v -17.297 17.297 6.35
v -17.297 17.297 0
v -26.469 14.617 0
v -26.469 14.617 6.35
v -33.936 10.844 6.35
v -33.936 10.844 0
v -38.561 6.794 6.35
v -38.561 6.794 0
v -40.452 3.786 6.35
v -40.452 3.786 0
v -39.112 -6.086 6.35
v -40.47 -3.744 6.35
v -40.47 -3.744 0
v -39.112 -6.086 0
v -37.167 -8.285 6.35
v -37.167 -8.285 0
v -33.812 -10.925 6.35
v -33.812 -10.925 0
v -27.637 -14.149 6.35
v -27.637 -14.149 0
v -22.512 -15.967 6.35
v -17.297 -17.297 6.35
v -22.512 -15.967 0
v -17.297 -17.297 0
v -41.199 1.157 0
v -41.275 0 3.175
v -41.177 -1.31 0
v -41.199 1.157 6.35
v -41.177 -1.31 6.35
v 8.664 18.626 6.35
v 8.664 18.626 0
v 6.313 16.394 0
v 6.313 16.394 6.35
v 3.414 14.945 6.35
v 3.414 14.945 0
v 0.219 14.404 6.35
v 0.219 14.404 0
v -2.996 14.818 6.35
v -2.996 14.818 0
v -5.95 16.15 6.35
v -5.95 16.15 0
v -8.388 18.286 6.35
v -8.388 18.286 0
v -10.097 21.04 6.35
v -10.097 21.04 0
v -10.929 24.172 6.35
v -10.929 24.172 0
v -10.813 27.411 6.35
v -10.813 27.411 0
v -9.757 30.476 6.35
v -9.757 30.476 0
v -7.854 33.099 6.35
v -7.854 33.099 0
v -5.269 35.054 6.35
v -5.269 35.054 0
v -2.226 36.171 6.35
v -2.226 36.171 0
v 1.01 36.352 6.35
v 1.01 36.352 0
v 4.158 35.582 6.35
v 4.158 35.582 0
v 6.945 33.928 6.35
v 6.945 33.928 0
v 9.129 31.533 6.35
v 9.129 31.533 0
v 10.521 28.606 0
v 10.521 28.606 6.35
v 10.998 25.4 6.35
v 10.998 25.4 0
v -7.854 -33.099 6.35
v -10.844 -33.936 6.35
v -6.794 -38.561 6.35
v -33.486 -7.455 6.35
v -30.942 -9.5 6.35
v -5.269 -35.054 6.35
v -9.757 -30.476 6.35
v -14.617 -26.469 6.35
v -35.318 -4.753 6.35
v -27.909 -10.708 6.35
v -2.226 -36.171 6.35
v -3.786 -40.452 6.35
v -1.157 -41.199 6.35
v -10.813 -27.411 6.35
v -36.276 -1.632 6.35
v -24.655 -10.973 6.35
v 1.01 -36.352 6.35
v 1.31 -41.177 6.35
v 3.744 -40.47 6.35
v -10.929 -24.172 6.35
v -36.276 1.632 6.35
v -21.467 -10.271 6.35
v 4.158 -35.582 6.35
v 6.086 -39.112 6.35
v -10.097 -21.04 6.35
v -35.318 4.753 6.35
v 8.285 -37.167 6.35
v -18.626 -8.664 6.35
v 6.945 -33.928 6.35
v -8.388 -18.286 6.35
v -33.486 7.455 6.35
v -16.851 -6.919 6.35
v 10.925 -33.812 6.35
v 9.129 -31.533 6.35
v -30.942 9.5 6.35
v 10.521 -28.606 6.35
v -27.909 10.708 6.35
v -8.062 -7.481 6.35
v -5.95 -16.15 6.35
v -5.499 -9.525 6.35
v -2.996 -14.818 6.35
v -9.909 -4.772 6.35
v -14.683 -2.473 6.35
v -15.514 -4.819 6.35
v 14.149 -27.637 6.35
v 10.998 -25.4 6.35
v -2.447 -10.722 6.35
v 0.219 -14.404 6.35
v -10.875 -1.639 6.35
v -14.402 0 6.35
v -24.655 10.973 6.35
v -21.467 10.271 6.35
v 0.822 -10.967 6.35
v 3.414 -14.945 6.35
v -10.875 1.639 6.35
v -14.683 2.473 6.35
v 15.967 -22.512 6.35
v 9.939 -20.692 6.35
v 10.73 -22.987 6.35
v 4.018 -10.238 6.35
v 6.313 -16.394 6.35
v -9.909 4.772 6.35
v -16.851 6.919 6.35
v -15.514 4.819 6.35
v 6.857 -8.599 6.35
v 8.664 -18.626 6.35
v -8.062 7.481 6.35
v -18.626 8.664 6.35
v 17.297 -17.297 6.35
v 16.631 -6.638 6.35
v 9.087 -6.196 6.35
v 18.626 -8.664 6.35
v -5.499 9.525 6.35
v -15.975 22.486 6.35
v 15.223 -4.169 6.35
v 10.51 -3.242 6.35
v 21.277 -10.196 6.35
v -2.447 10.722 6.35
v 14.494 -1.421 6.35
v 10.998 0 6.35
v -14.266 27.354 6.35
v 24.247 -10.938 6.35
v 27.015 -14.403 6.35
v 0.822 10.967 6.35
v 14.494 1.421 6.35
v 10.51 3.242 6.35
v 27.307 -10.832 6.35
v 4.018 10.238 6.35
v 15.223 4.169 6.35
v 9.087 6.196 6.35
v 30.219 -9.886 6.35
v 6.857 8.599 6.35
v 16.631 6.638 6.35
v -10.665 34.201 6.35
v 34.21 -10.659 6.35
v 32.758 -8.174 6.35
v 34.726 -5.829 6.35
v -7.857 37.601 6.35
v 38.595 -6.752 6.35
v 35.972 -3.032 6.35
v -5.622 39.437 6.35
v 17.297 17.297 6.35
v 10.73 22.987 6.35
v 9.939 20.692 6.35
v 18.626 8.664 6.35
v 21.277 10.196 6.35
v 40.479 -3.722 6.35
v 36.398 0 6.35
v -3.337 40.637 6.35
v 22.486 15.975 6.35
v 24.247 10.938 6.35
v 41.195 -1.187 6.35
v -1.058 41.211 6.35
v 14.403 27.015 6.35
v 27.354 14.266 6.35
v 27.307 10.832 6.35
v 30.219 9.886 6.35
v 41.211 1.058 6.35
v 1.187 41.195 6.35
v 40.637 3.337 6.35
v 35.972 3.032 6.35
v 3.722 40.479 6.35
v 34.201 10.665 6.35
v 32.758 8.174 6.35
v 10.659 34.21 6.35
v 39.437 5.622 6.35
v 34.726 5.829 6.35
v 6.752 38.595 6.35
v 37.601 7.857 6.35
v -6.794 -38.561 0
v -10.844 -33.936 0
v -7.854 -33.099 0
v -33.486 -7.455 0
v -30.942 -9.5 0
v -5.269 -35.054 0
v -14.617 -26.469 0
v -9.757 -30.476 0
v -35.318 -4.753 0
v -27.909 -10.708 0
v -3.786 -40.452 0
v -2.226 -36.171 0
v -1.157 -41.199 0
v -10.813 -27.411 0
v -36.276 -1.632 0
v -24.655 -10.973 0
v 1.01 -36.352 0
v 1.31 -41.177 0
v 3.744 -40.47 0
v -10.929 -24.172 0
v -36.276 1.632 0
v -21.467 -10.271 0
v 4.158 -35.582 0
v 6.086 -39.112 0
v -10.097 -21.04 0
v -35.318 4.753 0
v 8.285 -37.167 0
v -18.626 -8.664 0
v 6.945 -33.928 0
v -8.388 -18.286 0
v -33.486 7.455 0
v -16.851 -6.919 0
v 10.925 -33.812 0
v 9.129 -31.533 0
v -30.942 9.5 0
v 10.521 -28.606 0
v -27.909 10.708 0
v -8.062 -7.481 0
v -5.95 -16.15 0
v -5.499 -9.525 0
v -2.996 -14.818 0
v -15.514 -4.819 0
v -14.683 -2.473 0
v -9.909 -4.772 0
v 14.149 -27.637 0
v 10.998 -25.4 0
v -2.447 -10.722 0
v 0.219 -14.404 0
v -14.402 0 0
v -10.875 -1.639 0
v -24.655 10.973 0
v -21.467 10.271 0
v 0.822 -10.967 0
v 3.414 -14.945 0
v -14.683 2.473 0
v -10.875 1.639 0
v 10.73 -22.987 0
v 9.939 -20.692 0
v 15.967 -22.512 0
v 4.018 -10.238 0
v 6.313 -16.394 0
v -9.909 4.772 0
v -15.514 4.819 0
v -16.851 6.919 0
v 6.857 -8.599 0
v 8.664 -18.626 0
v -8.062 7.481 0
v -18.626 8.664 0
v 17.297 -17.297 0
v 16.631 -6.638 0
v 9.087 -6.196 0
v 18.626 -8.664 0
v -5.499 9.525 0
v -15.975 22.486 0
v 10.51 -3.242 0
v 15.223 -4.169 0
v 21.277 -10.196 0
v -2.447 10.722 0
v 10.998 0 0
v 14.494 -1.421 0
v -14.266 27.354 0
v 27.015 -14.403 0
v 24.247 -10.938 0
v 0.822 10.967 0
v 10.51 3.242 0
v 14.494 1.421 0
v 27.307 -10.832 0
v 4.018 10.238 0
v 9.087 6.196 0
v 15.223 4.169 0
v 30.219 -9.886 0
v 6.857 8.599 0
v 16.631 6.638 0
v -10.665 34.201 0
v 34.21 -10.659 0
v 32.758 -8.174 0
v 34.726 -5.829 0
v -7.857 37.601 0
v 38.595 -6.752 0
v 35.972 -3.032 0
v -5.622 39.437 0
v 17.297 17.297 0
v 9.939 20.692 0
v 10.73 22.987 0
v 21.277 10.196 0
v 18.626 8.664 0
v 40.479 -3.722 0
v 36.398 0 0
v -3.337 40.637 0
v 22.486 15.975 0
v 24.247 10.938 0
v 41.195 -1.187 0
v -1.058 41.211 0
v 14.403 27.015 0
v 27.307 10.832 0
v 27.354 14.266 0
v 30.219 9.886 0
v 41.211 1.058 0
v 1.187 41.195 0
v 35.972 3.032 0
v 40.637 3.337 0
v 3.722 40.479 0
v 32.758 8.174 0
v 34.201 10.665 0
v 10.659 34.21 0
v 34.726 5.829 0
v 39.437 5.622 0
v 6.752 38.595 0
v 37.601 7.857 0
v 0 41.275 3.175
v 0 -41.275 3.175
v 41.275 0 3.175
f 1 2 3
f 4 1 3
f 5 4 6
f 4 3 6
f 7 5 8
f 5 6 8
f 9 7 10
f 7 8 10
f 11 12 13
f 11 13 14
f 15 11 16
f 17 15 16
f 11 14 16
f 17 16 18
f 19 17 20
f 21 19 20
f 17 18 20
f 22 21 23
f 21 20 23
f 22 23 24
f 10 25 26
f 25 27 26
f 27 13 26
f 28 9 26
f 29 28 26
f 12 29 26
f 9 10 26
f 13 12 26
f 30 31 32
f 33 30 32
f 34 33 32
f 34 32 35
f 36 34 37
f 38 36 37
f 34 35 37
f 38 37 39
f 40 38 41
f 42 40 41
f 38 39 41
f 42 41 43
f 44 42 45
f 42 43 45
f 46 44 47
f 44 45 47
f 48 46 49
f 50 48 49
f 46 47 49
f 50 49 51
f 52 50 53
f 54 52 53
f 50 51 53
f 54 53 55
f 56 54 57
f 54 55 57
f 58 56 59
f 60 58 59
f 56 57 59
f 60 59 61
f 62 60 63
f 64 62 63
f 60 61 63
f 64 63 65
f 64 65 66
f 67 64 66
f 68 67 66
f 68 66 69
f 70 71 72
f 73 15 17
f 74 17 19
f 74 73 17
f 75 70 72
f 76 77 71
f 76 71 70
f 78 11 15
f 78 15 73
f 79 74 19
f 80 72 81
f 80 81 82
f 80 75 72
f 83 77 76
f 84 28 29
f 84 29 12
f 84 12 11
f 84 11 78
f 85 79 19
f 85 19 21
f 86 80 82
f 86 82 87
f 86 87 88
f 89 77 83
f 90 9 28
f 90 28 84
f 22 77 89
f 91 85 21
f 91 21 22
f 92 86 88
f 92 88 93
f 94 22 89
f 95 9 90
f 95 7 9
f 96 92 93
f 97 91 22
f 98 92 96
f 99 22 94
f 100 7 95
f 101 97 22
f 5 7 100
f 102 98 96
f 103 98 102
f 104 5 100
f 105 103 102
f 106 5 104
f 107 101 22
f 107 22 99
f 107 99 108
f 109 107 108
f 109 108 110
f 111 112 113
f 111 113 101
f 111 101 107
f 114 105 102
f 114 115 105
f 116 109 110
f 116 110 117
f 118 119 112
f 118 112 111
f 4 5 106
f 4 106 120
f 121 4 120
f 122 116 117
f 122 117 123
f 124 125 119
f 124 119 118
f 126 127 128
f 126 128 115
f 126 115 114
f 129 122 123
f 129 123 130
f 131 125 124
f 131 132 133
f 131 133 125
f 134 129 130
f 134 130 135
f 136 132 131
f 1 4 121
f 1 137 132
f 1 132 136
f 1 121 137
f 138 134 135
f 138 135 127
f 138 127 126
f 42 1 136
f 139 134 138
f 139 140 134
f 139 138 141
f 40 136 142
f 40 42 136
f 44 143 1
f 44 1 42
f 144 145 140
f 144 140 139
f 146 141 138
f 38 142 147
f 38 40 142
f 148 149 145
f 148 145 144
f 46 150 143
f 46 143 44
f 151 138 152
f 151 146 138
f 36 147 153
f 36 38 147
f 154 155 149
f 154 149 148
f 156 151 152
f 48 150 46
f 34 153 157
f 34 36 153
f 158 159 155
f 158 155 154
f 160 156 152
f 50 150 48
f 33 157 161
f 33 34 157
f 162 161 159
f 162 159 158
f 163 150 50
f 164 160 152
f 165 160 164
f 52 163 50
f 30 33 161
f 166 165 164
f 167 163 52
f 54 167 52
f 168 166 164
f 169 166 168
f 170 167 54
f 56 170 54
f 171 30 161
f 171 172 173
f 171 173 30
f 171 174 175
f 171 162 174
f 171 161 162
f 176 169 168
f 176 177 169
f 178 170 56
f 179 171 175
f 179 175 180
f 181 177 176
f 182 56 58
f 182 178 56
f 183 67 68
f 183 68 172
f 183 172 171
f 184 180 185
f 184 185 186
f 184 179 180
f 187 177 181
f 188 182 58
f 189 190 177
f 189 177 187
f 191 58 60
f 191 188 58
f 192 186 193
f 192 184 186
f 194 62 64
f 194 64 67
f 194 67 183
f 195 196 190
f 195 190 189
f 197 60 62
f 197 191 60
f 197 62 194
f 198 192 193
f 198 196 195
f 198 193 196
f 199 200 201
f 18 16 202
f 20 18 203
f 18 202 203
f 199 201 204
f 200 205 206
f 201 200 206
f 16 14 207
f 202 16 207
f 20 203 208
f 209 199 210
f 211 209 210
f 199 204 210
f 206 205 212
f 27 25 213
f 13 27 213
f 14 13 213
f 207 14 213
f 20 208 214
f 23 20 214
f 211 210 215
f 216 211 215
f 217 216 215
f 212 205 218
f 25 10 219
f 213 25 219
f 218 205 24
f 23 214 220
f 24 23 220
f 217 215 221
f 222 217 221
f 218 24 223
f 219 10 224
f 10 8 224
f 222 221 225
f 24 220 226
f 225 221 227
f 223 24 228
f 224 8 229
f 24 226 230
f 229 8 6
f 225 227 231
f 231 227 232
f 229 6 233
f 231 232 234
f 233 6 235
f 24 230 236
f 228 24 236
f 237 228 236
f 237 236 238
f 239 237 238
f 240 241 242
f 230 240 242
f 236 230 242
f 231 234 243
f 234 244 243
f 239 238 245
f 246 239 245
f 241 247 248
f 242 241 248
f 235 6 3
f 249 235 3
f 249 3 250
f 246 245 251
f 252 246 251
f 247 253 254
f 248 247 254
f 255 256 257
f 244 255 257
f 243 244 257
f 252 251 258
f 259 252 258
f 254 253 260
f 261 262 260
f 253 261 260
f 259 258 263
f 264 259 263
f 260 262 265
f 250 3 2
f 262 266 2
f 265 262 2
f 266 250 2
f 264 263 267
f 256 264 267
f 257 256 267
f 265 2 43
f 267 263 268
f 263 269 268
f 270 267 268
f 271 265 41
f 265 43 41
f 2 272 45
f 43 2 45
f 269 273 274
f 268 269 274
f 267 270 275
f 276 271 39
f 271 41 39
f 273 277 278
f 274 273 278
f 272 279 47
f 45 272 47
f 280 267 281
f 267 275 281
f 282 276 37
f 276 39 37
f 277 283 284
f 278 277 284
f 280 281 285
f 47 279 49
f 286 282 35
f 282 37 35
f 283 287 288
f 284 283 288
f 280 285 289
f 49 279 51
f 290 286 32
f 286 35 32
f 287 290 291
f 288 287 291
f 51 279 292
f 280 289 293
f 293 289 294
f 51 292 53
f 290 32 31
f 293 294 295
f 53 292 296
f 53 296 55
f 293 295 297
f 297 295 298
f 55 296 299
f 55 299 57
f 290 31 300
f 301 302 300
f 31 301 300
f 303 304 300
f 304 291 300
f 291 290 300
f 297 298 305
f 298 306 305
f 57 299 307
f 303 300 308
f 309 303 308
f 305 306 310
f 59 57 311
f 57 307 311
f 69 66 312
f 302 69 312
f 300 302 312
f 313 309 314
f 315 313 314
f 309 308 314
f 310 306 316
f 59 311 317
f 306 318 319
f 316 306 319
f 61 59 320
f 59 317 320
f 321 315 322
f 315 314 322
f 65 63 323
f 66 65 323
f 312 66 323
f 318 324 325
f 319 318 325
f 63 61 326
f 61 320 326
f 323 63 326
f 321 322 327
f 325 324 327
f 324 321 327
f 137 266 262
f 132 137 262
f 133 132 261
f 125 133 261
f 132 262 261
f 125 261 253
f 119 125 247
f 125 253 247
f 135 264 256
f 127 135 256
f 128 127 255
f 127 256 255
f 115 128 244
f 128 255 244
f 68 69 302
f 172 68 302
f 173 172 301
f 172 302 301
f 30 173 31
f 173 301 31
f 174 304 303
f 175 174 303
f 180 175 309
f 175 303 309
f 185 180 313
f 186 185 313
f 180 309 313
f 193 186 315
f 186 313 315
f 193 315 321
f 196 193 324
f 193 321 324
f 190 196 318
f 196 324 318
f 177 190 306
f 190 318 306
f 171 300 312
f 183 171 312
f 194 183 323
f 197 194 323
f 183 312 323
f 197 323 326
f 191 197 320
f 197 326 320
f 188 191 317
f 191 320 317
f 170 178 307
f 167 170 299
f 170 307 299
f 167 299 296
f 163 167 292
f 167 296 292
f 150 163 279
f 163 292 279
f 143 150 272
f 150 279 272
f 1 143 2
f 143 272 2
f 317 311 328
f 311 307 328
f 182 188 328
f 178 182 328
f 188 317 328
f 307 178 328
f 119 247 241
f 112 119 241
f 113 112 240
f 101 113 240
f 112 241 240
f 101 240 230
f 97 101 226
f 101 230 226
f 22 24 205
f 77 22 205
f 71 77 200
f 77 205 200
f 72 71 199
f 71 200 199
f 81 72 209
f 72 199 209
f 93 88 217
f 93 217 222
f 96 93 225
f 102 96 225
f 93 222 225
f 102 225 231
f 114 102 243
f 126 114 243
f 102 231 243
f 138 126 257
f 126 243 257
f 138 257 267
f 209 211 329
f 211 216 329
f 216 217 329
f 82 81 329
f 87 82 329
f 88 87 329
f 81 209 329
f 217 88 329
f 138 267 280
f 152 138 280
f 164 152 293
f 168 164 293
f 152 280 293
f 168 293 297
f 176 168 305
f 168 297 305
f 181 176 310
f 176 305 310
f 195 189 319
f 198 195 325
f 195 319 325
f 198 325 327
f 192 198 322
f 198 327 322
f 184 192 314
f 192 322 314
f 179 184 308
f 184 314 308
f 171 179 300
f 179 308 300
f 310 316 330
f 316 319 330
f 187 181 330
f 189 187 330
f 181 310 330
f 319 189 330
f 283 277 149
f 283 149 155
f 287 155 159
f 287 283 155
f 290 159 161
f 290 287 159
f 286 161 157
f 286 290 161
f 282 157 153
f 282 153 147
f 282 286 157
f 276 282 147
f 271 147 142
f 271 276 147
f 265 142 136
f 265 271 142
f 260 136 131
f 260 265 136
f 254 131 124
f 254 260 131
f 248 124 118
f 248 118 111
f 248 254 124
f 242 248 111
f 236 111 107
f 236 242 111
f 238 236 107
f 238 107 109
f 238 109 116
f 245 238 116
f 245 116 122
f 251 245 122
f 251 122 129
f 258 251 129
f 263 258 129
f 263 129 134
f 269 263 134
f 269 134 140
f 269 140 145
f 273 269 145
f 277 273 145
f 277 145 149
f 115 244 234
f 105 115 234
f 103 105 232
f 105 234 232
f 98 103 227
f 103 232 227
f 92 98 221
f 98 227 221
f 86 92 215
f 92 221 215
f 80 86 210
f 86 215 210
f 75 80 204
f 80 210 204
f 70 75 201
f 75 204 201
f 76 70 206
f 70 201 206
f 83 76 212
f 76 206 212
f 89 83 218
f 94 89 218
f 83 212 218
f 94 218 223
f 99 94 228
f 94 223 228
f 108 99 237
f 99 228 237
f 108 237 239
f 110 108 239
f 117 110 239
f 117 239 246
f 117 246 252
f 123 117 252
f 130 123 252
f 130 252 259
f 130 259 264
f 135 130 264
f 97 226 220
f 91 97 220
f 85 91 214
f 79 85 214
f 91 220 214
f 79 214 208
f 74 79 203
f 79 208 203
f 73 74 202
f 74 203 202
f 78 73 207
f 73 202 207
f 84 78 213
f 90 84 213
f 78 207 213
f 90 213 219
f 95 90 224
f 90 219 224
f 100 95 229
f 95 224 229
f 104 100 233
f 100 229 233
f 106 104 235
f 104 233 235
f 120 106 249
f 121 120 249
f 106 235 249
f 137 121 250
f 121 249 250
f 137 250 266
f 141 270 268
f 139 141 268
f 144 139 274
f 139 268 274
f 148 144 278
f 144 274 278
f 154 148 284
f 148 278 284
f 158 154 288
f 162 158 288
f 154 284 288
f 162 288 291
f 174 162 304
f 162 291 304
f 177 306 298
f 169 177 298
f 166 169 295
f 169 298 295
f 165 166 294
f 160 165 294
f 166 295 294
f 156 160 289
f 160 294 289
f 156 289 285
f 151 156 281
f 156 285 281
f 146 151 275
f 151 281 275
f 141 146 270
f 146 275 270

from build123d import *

# Parameters (mm, degrees)
F0_R     = 10.9982
F1_DEPTH = 25.4
F2_DEPTH = 19.05


with BuildPart() as f1:
    # F0 (on Top) → F1 (new body)
    with BuildSketch(Plane.XY):
        with BuildLine():
            add(Edge.make_bspline(
                [(17.2966262747, -17.2966262747), (41.275, -12.1888070196), (41.275, 0)],
                knots=[5.144796756, 5.144796756, 5.144796756, 6.2831853072, 6.2831853072, 6.2831853072], degree=2, weights=[1, 0.8423354965, 1]))
            add(Edge.make_bspline(
                [(41.275, 0), (41.275, 12.1888070196), (17.2966262747, 17.2966262747)],
                knots=[0, 0, 0, 1.1383885512, 1.1383885512, 1.1383885512], degree=2, weights=[1, 0.8423354965, 1]))
            add(Edge.make_bspline(
                [(18.6255683012, 8.6641490291), (18.1820471955, 13.1400669524), (17.2966262747, 17.2966262747)],
                knots=[4.9238747078, 4.9238747078, 4.9238747078, 5.144796756, 5.144796756, 5.144796756], degree=2, weights=[1, 0.9939053819, 1]))
            ThreePointArc((18.6255683012, 8.6641490291), (30.2194319442, 9.8860244272), (36.3982, 0))
            ThreePointArc((36.3982, 0), (30.2194319442, -9.8860244272), (18.6255683012, -8.6641490291))
            add(Edge.make_bspline(
                [(17.2966262747, -17.2966262747), (18.1820471955, -13.1400669524), (18.6255683012, -8.6641490291)],
                knots=[4.2799812048, 4.2799812048, 4.2799812048, 4.5009032529, 4.5009032529, 4.5009032529], degree=2, weights=[1, 0.9939053819, 1]))
        make_face()
        with BuildLine():
            add(Edge.make_bspline(
                [(18.6255683012, 8.6641490291), (18.1820471955, 13.1400669524), (17.2966262747, 17.2966262747)],
                knots=[4.9238747078, 4.9238747078, 4.9238747078, 5.144796756, 5.144796756, 5.144796756], degree=2, weights=[1, 0.9939053819, 1]))
            add(Edge.make_bspline(
                [(17.2966262747, 17.2966262747), (13.1400669524, 18.1820471955), (8.6641490291, 18.6255683012)],
                knots=[1.1383885512, 1.1383885512, 1.1383885512, 1.3593105993, 1.3593105993, 1.3593105993], degree=2, weights=[1, 0.9939053819, 1]))
            ThreePointArc((8.6641490291, 18.6255683012), (0, 14.4018), (-8.6641490291, 18.6255683012))
            add(Edge.make_bspline(
                [(-8.6641490291, 18.6255683012), (-13.1400669524, 18.1820471955), (-17.2966262747, 17.2966262747)],
                knots=[1.7822820542, 1.7822820542, 1.7822820542, 2.0032041024, 2.0032041024, 2.0032041024], degree=2, weights=[1, 0.9939053819, 1]))
            add(Edge.make_bspline(
                [(-17.2966262747, 17.2966262747), (-18.1820471955, 13.1400669524), (-18.6255683012, 8.6641490291)],
                knots=[1.1383885512, 1.1383885512, 1.1383885512, 1.3593105993, 1.3593105993, 1.3593105993], degree=2, weights=[1, 0.9939053819, 1]))
            ThreePointArc((-18.6255683012, 8.6641490291), (-15.5139755728, 4.8194319442), (-14.4018, 0))
            ThreePointArc((-14.4018, 0), (-15.5139755728, -4.8194319442), (-18.6255683012, -8.6641490291))
            add(Edge.make_bspline(
                [(-18.6255683012, -8.6641490291), (-18.1820471955, -13.1400669524), (-17.2966262747, -17.2966262747)],
                knots=[1.7822820542, 1.7822820542, 1.7822820542, 2.0032041024, 2.0032041024, 2.0032041024], degree=2, weights=[1, 0.9939053819, 1]))
            add(Edge.make_bspline(
                [(-17.2966262747, -17.2966262747), (-13.1400669524, -18.1820471955), (-8.6641490291, -18.6255683012)],
                knots=[4.2799812048, 4.2799812048, 4.2799812048, 4.5009032529, 4.5009032529, 4.5009032529], degree=2, weights=[1, 0.9939053819, 1]))
            ThreePointArc((-8.6641490291, -18.6255683012), (0, -14.4018), (8.6641490291, -18.6255683012))
            add(Edge.make_bspline(
                [(8.6641490291, -18.6255683012), (13.1400669524, -18.1820471955), (17.2966262747, -17.2966262747)],
                knots=[4.9238747078, 4.9238747078, 4.9238747078, 5.144796756, 5.144796756, 5.144796756], degree=2, weights=[1, 0.9939053819, 1]))
            add(Edge.make_bspline(
                [(17.2966262747, -17.2966262747), (18.1820471955, -13.1400669524), (18.6255683012, -8.6641490291)],
                knots=[4.2799812048, 4.2799812048, 4.2799812048, 4.5009032529, 4.5009032529, 4.5009032529], degree=2, weights=[1, 0.9939053819, 1]))
            ThreePointArc((18.6255683012, -8.6641490291), (14.4018, 0), (18.6255683012, 8.6641490291))
        make_face()
        Circle(F0_R, mode=Mode.SUBTRACT)
        with BuildLine():
            add(Edge.make_bspline(
                [(17.2966262747, 17.2966262747), (13.1400669524, 18.1820471955), (8.6641490291, 18.6255683012)],
                knots=[1.1383885512, 1.1383885512, 1.1383885512, 1.3593105993, 1.3593105993, 1.3593105993], degree=2, weights=[1, 0.9939053819, 1]))
            add(Edge.make_bspline(
                [(17.2966262747, 17.2966262747), (12.1888070196, 41.275), (0, 41.275)],
                knots=[5.144796756, 5.144796756, 5.144796756, 6.2831853072, 6.2831853072, 6.2831853072], degree=2, weights=[1, 0.8423354965, 1]))
            add(Edge.make_bspline(
                [(0, 41.275), (-12.1888070196, 41.275), (-17.2966262747, 17.2966262747)],
                knots=[0, 0, 0, 1.1383885512, 1.1383885512, 1.1383885512], degree=2, weights=[1, 0.8423354965, 1]))
            add(Edge.make_bspline(
                [(-8.6641490291, 18.6255683012), (-13.1400669524, 18.1820471955), (-17.2966262747, 17.2966262747)],
                knots=[1.7822820542, 1.7822820542, 1.7822820542, 2.0032041024, 2.0032041024, 2.0032041024], degree=2, weights=[1, 0.9939053819, 1]))
            ThreePointArc((-8.6641490291, 18.6255683012), (-3.5826219022, 35.7983279207), (10.9982, 25.4))
            ThreePointArc((10.9982, 25.4), (10.3983279207, 21.8173780978), (8.6641490291, 18.6255683012))
        make_face()
        with BuildLine():
            add(Edge.make_bspline(
                [(-17.2966262747, -17.2966262747), (0, -98.4946773978), (17.2966262747, -17.2966262747)],
                knots=[2.0032041024, 2.0032041024, 2.0032041024, 4.2799812048, 4.2799812048, 4.2799812048], degree=2, weights=[1, 0.4190581775, 1]))
            add(Edge.make_bspline(
                [(8.6641490291, -18.6255683012), (13.1400669524, -18.1820471955), (17.2966262747, -17.2966262747)],
                knots=[4.9238747078, 4.9238747078, 4.9238747078, 5.144796756, 5.144796756, 5.144796756], degree=2, weights=[1, 0.9939053819, 1]))
            ThreePointArc((8.6641490291, -18.6255683012), (10.3983279207, -21.8173780978), (10.9982, -25.4))
            ThreePointArc((10.9982, -25.4), (-3.5826219022, -35.7983279207), (-8.6641490291, -18.6255683012))
            add(Edge.make_bspline(
                [(-17.2966262747, -17.2966262747), (-13.1400669524, -18.1820471955), (-8.6641490291, -18.6255683012)],
                knots=[4.2799812048, 4.2799812048, 4.2799812048, 4.5009032529, 4.5009032529, 4.5009032529], degree=2, weights=[1, 0.9939053819, 1]))
        make_face()
        with BuildLine():
            add(Edge.make_bspline(
                [(-17.2966262747, 17.2966262747), (-98.4946773978, 0), (-17.2966262747, -17.2966262747)],
                knots=[2.0032041024, 2.0032041024, 2.0032041024, 4.2799812048, 4.2799812048, 4.2799812048], degree=2, weights=[1, 0.4190581775, 1]))
            add(Edge.make_bspline(
                [(-18.6255683012, -8.6641490291), (-18.1820471955, -13.1400669524), (-17.2966262747, -17.2966262747)],
                knots=[1.7822820542, 1.7822820542, 1.7822820542, 2.0032041024, 2.0032041024, 2.0032041024], degree=2, weights=[1, 0.9939053819, 1]))
            ThreePointArc((-18.6255683012, -8.6641490291), (-36.3982, 0), (-18.6255683012, 8.6641490291))
            add(Edge.make_bspline(
                [(-17.2966262747, 17.2966262747), (-18.1820471955, 13.1400669524), (-18.6255683012, 8.6641490291)],
                knots=[1.1383885512, 1.1383885512, 1.1383885512, 1.3593105993, 1.3593105993, 1.3593105993], degree=2, weights=[1, 0.9939053819, 1]))
        make_face()
    extrude(amount=F1_DEPTH)

    # F2 (cut): a face of the model
    f2_faces = [f1.faces().sort_by_distance(p)[0] for p in [
        (9.5838282566, 32.8935218357, 25.4),
    ]]
    extrude(f2_faces, amount=-F2_DEPTH, mode=Mode.SUBTRACT)


solid = f1.part
